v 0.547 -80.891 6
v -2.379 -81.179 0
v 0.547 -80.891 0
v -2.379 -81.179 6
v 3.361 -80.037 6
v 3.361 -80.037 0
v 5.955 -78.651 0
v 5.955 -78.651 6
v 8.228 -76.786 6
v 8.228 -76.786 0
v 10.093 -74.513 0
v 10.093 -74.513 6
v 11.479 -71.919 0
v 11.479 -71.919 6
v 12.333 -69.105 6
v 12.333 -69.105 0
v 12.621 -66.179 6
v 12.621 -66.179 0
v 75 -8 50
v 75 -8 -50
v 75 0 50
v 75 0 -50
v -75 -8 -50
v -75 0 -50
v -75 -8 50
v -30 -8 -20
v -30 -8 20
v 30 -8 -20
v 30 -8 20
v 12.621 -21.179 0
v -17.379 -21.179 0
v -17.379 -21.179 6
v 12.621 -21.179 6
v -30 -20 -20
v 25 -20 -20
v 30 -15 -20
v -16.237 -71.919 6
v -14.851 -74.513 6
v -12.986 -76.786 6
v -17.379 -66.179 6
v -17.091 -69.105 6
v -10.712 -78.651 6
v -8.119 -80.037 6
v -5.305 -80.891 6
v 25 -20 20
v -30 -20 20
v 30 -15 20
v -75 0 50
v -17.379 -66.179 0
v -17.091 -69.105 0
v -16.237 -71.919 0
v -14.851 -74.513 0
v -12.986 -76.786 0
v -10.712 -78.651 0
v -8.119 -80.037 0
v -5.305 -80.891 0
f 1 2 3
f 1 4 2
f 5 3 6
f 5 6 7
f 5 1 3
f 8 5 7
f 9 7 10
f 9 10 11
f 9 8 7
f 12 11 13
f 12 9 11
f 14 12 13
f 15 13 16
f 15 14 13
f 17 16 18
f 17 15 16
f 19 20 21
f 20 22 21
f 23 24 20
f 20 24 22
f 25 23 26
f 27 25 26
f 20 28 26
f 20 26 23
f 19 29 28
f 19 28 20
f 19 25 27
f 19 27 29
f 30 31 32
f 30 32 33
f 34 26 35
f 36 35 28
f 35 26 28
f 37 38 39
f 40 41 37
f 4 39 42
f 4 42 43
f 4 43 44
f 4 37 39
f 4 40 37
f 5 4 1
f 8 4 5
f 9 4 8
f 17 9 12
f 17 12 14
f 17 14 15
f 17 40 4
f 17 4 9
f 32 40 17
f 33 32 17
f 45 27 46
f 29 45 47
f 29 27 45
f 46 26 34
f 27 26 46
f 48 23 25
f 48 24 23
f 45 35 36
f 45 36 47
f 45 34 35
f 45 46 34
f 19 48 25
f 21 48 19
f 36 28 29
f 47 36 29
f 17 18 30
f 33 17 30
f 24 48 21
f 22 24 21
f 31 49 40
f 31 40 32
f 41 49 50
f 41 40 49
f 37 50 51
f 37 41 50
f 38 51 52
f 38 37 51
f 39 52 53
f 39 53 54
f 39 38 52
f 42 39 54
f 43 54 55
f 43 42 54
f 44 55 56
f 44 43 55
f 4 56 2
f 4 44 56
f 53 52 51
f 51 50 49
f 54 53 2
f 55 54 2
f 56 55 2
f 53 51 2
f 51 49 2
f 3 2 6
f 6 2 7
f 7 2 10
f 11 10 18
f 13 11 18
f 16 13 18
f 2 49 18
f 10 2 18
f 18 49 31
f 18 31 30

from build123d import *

# Parameters (mm, degrees)
F0_W     = 150
F0_H     = 100
F1_DEPTH = 3
F2_DEPTH = 5
F3_W     = 60
F3_H     = 40
F4_DEPTH = 10
F5_DEPTH = 10
F6_SIZE  = 5
F7_W     = 30
F7_H     = 60
F8_DEPTH = 6
F9_R     = 14.99999


# Not quite as in the source:
# - a fillet or chamfer is up to 0.001 mm smaller than in the source, because OpenCascade refuses the exact size


with BuildPart() as f1:
    # F0 (on Front) → F1 (new body)
    with BuildSketch(Plane.XZ):
        Rectangle(F0_W, F0_H)
    extrude(amount=F1_DEPTH)

    # F2 (add): a face of the model
    f2_faces = [f1.faces().sort_by_distance(p)[0] for p in [
        (0, -3, 0),
    ]]
    extrude(f2_faces, amount=F2_DEPTH)

    # F3 (on Front) → F4 (join)
    with BuildSketch(Plane.XZ):
        Rectangle(F3_W, F3_H)
    extrude(amount=F4_DEPTH)

    # F5 (add): a face of the model
    f5_faces = [f1.faces().sort_by_distance(p)[0] for p in [
        (0, -10, 0),
    ]]
    extrude(f5_faces, amount=F5_DEPTH)

    # F6
    f6_edges = [f1.edges().sort_by_distance(p)[0] for p in [
        (30, -20, 0),
    ]]
    chamfer(f6_edges, length=F6_SIZE)


with BuildPart() as f8:
    # F7 (on Top) → F8 (new body)
    with BuildSketch(Plane.XY):
        with Locations((-2.3789281398, -51.1790004373)):
            Rectangle(F7_W, F7_H)
    extrude(amount=F8_DEPTH)

    # F9 (radius 15 in the source; OpenCascade refuses exactly that, so slightly less here)
    f9_edges = [f8.edges().sort_by_distance(p)[0] for p in [
        (12.621072, -81.179, 3),
        (-17.378928, -81.179, 3),
    ]]
    fillet(f9_edges, radius=F9_R)


solid = Compound([f1.part, f8.part])
